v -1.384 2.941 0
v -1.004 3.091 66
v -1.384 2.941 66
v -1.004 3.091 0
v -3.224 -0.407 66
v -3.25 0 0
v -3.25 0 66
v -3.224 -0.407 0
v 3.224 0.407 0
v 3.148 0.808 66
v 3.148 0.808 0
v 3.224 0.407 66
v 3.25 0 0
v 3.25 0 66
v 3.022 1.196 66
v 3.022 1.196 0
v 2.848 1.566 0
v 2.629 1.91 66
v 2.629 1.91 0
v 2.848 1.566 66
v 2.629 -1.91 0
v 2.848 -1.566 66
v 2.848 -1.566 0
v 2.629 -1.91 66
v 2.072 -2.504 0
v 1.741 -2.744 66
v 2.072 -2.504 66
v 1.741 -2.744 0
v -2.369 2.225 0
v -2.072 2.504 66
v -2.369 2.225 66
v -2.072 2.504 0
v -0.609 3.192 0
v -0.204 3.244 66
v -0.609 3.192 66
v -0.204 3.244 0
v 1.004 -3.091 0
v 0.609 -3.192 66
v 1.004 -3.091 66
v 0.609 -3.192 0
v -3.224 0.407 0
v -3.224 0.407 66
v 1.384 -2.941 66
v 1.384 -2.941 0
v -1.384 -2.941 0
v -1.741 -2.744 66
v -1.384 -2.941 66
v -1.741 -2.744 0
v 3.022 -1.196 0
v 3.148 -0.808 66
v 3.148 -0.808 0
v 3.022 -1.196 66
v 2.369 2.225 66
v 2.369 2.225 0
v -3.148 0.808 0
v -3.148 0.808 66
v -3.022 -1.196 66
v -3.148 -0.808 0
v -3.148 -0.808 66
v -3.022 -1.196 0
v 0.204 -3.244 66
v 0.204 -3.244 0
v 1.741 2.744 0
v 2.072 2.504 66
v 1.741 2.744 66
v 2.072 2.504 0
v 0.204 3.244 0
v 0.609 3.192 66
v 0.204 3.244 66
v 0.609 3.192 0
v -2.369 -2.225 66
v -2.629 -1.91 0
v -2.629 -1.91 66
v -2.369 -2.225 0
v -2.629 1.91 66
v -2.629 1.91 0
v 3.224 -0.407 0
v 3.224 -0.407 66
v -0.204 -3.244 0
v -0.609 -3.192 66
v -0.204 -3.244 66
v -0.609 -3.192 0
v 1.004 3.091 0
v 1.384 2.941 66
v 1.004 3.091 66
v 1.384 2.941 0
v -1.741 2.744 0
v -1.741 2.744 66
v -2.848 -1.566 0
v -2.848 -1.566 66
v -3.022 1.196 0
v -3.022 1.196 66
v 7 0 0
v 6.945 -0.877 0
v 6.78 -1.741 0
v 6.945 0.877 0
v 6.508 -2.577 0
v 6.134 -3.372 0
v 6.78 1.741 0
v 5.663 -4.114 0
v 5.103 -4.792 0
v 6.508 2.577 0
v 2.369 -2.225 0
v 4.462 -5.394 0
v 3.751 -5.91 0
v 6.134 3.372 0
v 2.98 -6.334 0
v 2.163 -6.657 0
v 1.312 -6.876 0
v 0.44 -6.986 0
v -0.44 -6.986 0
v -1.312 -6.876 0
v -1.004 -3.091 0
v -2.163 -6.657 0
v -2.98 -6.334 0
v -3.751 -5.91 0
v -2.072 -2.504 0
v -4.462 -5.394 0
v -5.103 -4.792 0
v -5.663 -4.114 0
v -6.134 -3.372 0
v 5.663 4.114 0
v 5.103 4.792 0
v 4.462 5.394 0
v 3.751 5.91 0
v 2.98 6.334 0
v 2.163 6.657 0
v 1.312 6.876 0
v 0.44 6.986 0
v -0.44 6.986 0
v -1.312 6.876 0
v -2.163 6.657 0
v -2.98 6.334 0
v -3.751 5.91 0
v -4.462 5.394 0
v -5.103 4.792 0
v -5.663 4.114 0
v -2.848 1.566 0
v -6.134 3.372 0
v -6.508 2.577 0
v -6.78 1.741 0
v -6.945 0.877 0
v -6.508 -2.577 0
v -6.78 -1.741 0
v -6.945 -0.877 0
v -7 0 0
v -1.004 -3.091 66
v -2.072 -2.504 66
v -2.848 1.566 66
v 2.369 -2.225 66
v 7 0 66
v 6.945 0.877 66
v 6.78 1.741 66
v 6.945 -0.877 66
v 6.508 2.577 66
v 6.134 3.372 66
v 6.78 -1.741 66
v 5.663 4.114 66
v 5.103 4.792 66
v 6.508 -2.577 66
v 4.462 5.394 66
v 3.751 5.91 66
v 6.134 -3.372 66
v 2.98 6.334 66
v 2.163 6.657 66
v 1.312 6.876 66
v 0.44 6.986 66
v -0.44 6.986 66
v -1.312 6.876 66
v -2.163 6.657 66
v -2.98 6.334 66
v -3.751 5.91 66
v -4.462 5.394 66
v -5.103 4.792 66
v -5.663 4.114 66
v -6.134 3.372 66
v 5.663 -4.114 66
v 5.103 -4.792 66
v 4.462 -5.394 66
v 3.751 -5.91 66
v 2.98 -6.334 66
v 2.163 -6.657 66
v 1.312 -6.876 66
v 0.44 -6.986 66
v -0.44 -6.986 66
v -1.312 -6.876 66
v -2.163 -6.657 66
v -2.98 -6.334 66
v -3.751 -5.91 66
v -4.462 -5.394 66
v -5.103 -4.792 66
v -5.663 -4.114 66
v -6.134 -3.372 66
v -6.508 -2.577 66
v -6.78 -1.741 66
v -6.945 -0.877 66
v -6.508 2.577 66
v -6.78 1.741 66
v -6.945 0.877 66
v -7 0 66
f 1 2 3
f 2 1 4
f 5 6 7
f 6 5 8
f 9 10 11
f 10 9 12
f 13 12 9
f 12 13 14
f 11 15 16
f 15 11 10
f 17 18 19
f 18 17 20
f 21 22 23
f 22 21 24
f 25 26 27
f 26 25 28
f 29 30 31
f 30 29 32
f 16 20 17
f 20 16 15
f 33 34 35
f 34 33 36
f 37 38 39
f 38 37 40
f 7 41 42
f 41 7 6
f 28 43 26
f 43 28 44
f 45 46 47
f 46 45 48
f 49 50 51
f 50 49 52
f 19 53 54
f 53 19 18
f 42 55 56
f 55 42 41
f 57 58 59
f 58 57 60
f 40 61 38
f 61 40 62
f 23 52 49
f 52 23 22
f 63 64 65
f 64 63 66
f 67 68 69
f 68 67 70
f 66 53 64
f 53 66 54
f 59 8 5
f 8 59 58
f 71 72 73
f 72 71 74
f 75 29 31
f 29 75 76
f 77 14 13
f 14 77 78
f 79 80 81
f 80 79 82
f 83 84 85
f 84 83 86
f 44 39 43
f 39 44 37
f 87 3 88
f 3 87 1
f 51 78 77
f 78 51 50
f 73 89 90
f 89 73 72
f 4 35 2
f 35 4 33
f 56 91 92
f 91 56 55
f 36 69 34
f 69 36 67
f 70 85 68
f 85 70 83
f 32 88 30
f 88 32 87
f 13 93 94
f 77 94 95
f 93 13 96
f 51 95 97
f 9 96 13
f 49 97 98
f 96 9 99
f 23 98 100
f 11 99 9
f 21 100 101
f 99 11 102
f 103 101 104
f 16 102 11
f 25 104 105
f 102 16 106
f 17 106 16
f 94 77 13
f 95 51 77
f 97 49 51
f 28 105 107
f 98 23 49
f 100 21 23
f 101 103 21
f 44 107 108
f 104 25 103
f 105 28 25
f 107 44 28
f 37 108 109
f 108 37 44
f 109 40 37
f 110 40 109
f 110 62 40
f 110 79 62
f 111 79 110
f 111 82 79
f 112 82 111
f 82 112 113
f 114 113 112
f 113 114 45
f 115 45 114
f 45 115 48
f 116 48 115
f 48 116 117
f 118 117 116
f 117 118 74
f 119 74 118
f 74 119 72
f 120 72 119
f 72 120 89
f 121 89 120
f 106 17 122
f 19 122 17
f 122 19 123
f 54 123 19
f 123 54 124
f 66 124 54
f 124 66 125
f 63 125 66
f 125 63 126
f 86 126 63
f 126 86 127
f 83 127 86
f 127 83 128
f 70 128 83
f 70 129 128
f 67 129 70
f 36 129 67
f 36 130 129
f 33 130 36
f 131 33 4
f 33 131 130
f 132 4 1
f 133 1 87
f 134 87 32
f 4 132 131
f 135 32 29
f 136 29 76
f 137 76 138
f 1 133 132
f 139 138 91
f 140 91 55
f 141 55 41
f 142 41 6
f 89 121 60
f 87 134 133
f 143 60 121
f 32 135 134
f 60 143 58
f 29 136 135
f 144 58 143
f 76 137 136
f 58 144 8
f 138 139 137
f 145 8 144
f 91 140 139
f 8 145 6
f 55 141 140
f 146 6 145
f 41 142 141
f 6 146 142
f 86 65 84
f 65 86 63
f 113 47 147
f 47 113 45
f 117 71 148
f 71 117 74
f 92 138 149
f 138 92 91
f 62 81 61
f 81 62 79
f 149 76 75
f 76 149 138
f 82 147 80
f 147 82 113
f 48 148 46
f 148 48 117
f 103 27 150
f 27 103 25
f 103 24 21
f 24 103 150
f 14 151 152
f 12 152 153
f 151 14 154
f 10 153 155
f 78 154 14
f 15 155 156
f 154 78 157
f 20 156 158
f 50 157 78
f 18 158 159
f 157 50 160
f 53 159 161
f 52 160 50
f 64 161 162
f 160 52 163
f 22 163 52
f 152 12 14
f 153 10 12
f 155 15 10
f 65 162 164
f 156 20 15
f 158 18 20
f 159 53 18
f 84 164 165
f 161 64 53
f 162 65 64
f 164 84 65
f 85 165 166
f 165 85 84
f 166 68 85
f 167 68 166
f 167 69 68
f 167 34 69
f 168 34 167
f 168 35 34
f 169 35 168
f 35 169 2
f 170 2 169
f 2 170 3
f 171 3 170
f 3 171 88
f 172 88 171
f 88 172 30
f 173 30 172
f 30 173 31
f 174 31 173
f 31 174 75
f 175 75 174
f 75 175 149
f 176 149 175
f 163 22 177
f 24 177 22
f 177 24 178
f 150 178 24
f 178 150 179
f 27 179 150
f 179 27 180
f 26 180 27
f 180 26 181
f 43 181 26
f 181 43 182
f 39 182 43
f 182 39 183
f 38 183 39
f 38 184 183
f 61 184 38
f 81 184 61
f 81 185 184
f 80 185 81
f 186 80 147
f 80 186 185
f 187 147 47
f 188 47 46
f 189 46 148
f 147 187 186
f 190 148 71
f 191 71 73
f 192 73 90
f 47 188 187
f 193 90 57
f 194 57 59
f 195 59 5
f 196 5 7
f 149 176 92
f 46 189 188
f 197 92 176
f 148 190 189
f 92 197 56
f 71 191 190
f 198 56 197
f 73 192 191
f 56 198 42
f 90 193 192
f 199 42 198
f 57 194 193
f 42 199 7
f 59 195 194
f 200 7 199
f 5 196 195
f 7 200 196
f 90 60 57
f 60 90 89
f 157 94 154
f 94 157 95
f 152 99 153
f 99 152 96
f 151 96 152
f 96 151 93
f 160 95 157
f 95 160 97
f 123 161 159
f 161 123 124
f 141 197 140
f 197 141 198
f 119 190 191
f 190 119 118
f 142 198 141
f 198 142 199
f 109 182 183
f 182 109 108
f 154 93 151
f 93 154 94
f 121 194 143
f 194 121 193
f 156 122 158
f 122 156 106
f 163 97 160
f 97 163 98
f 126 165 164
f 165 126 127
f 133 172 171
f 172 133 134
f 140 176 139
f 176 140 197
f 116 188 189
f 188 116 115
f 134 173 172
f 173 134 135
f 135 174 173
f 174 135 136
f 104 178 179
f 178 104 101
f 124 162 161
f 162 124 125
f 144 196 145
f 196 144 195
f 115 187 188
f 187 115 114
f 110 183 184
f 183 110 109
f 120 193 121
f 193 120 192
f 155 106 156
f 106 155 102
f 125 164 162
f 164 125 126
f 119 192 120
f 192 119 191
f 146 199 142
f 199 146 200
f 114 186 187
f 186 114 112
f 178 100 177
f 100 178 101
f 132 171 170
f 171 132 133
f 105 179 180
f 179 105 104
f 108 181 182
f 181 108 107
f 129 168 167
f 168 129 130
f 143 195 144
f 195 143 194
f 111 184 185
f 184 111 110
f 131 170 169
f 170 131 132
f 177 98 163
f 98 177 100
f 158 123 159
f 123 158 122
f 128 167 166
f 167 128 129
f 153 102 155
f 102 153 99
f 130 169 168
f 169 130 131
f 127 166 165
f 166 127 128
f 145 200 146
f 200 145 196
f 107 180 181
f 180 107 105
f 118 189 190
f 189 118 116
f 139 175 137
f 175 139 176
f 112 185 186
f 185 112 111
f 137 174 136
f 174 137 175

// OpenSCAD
$fn = 50;


difference() {
	union() {
		cylinder(h = 66, r = 7.0000000000);
	}
	union() {
		cylinder(h = 66, r = 3.2500000000);
		cylinder(h = 66, r = 3.2500000000);
		cylinder(h = 66, r = 1.8000000000);
		cylinder(h = 66, r = 1.8000000000);
		cylinder(h = 66, r = 1.8000000000);
		cylinder(h = 66, r = 1.8000000000);
		cylinder(h = 66, r = 1.8000000000);
		cylinder(h = 66, r = 1.8000000000);
	}
}
